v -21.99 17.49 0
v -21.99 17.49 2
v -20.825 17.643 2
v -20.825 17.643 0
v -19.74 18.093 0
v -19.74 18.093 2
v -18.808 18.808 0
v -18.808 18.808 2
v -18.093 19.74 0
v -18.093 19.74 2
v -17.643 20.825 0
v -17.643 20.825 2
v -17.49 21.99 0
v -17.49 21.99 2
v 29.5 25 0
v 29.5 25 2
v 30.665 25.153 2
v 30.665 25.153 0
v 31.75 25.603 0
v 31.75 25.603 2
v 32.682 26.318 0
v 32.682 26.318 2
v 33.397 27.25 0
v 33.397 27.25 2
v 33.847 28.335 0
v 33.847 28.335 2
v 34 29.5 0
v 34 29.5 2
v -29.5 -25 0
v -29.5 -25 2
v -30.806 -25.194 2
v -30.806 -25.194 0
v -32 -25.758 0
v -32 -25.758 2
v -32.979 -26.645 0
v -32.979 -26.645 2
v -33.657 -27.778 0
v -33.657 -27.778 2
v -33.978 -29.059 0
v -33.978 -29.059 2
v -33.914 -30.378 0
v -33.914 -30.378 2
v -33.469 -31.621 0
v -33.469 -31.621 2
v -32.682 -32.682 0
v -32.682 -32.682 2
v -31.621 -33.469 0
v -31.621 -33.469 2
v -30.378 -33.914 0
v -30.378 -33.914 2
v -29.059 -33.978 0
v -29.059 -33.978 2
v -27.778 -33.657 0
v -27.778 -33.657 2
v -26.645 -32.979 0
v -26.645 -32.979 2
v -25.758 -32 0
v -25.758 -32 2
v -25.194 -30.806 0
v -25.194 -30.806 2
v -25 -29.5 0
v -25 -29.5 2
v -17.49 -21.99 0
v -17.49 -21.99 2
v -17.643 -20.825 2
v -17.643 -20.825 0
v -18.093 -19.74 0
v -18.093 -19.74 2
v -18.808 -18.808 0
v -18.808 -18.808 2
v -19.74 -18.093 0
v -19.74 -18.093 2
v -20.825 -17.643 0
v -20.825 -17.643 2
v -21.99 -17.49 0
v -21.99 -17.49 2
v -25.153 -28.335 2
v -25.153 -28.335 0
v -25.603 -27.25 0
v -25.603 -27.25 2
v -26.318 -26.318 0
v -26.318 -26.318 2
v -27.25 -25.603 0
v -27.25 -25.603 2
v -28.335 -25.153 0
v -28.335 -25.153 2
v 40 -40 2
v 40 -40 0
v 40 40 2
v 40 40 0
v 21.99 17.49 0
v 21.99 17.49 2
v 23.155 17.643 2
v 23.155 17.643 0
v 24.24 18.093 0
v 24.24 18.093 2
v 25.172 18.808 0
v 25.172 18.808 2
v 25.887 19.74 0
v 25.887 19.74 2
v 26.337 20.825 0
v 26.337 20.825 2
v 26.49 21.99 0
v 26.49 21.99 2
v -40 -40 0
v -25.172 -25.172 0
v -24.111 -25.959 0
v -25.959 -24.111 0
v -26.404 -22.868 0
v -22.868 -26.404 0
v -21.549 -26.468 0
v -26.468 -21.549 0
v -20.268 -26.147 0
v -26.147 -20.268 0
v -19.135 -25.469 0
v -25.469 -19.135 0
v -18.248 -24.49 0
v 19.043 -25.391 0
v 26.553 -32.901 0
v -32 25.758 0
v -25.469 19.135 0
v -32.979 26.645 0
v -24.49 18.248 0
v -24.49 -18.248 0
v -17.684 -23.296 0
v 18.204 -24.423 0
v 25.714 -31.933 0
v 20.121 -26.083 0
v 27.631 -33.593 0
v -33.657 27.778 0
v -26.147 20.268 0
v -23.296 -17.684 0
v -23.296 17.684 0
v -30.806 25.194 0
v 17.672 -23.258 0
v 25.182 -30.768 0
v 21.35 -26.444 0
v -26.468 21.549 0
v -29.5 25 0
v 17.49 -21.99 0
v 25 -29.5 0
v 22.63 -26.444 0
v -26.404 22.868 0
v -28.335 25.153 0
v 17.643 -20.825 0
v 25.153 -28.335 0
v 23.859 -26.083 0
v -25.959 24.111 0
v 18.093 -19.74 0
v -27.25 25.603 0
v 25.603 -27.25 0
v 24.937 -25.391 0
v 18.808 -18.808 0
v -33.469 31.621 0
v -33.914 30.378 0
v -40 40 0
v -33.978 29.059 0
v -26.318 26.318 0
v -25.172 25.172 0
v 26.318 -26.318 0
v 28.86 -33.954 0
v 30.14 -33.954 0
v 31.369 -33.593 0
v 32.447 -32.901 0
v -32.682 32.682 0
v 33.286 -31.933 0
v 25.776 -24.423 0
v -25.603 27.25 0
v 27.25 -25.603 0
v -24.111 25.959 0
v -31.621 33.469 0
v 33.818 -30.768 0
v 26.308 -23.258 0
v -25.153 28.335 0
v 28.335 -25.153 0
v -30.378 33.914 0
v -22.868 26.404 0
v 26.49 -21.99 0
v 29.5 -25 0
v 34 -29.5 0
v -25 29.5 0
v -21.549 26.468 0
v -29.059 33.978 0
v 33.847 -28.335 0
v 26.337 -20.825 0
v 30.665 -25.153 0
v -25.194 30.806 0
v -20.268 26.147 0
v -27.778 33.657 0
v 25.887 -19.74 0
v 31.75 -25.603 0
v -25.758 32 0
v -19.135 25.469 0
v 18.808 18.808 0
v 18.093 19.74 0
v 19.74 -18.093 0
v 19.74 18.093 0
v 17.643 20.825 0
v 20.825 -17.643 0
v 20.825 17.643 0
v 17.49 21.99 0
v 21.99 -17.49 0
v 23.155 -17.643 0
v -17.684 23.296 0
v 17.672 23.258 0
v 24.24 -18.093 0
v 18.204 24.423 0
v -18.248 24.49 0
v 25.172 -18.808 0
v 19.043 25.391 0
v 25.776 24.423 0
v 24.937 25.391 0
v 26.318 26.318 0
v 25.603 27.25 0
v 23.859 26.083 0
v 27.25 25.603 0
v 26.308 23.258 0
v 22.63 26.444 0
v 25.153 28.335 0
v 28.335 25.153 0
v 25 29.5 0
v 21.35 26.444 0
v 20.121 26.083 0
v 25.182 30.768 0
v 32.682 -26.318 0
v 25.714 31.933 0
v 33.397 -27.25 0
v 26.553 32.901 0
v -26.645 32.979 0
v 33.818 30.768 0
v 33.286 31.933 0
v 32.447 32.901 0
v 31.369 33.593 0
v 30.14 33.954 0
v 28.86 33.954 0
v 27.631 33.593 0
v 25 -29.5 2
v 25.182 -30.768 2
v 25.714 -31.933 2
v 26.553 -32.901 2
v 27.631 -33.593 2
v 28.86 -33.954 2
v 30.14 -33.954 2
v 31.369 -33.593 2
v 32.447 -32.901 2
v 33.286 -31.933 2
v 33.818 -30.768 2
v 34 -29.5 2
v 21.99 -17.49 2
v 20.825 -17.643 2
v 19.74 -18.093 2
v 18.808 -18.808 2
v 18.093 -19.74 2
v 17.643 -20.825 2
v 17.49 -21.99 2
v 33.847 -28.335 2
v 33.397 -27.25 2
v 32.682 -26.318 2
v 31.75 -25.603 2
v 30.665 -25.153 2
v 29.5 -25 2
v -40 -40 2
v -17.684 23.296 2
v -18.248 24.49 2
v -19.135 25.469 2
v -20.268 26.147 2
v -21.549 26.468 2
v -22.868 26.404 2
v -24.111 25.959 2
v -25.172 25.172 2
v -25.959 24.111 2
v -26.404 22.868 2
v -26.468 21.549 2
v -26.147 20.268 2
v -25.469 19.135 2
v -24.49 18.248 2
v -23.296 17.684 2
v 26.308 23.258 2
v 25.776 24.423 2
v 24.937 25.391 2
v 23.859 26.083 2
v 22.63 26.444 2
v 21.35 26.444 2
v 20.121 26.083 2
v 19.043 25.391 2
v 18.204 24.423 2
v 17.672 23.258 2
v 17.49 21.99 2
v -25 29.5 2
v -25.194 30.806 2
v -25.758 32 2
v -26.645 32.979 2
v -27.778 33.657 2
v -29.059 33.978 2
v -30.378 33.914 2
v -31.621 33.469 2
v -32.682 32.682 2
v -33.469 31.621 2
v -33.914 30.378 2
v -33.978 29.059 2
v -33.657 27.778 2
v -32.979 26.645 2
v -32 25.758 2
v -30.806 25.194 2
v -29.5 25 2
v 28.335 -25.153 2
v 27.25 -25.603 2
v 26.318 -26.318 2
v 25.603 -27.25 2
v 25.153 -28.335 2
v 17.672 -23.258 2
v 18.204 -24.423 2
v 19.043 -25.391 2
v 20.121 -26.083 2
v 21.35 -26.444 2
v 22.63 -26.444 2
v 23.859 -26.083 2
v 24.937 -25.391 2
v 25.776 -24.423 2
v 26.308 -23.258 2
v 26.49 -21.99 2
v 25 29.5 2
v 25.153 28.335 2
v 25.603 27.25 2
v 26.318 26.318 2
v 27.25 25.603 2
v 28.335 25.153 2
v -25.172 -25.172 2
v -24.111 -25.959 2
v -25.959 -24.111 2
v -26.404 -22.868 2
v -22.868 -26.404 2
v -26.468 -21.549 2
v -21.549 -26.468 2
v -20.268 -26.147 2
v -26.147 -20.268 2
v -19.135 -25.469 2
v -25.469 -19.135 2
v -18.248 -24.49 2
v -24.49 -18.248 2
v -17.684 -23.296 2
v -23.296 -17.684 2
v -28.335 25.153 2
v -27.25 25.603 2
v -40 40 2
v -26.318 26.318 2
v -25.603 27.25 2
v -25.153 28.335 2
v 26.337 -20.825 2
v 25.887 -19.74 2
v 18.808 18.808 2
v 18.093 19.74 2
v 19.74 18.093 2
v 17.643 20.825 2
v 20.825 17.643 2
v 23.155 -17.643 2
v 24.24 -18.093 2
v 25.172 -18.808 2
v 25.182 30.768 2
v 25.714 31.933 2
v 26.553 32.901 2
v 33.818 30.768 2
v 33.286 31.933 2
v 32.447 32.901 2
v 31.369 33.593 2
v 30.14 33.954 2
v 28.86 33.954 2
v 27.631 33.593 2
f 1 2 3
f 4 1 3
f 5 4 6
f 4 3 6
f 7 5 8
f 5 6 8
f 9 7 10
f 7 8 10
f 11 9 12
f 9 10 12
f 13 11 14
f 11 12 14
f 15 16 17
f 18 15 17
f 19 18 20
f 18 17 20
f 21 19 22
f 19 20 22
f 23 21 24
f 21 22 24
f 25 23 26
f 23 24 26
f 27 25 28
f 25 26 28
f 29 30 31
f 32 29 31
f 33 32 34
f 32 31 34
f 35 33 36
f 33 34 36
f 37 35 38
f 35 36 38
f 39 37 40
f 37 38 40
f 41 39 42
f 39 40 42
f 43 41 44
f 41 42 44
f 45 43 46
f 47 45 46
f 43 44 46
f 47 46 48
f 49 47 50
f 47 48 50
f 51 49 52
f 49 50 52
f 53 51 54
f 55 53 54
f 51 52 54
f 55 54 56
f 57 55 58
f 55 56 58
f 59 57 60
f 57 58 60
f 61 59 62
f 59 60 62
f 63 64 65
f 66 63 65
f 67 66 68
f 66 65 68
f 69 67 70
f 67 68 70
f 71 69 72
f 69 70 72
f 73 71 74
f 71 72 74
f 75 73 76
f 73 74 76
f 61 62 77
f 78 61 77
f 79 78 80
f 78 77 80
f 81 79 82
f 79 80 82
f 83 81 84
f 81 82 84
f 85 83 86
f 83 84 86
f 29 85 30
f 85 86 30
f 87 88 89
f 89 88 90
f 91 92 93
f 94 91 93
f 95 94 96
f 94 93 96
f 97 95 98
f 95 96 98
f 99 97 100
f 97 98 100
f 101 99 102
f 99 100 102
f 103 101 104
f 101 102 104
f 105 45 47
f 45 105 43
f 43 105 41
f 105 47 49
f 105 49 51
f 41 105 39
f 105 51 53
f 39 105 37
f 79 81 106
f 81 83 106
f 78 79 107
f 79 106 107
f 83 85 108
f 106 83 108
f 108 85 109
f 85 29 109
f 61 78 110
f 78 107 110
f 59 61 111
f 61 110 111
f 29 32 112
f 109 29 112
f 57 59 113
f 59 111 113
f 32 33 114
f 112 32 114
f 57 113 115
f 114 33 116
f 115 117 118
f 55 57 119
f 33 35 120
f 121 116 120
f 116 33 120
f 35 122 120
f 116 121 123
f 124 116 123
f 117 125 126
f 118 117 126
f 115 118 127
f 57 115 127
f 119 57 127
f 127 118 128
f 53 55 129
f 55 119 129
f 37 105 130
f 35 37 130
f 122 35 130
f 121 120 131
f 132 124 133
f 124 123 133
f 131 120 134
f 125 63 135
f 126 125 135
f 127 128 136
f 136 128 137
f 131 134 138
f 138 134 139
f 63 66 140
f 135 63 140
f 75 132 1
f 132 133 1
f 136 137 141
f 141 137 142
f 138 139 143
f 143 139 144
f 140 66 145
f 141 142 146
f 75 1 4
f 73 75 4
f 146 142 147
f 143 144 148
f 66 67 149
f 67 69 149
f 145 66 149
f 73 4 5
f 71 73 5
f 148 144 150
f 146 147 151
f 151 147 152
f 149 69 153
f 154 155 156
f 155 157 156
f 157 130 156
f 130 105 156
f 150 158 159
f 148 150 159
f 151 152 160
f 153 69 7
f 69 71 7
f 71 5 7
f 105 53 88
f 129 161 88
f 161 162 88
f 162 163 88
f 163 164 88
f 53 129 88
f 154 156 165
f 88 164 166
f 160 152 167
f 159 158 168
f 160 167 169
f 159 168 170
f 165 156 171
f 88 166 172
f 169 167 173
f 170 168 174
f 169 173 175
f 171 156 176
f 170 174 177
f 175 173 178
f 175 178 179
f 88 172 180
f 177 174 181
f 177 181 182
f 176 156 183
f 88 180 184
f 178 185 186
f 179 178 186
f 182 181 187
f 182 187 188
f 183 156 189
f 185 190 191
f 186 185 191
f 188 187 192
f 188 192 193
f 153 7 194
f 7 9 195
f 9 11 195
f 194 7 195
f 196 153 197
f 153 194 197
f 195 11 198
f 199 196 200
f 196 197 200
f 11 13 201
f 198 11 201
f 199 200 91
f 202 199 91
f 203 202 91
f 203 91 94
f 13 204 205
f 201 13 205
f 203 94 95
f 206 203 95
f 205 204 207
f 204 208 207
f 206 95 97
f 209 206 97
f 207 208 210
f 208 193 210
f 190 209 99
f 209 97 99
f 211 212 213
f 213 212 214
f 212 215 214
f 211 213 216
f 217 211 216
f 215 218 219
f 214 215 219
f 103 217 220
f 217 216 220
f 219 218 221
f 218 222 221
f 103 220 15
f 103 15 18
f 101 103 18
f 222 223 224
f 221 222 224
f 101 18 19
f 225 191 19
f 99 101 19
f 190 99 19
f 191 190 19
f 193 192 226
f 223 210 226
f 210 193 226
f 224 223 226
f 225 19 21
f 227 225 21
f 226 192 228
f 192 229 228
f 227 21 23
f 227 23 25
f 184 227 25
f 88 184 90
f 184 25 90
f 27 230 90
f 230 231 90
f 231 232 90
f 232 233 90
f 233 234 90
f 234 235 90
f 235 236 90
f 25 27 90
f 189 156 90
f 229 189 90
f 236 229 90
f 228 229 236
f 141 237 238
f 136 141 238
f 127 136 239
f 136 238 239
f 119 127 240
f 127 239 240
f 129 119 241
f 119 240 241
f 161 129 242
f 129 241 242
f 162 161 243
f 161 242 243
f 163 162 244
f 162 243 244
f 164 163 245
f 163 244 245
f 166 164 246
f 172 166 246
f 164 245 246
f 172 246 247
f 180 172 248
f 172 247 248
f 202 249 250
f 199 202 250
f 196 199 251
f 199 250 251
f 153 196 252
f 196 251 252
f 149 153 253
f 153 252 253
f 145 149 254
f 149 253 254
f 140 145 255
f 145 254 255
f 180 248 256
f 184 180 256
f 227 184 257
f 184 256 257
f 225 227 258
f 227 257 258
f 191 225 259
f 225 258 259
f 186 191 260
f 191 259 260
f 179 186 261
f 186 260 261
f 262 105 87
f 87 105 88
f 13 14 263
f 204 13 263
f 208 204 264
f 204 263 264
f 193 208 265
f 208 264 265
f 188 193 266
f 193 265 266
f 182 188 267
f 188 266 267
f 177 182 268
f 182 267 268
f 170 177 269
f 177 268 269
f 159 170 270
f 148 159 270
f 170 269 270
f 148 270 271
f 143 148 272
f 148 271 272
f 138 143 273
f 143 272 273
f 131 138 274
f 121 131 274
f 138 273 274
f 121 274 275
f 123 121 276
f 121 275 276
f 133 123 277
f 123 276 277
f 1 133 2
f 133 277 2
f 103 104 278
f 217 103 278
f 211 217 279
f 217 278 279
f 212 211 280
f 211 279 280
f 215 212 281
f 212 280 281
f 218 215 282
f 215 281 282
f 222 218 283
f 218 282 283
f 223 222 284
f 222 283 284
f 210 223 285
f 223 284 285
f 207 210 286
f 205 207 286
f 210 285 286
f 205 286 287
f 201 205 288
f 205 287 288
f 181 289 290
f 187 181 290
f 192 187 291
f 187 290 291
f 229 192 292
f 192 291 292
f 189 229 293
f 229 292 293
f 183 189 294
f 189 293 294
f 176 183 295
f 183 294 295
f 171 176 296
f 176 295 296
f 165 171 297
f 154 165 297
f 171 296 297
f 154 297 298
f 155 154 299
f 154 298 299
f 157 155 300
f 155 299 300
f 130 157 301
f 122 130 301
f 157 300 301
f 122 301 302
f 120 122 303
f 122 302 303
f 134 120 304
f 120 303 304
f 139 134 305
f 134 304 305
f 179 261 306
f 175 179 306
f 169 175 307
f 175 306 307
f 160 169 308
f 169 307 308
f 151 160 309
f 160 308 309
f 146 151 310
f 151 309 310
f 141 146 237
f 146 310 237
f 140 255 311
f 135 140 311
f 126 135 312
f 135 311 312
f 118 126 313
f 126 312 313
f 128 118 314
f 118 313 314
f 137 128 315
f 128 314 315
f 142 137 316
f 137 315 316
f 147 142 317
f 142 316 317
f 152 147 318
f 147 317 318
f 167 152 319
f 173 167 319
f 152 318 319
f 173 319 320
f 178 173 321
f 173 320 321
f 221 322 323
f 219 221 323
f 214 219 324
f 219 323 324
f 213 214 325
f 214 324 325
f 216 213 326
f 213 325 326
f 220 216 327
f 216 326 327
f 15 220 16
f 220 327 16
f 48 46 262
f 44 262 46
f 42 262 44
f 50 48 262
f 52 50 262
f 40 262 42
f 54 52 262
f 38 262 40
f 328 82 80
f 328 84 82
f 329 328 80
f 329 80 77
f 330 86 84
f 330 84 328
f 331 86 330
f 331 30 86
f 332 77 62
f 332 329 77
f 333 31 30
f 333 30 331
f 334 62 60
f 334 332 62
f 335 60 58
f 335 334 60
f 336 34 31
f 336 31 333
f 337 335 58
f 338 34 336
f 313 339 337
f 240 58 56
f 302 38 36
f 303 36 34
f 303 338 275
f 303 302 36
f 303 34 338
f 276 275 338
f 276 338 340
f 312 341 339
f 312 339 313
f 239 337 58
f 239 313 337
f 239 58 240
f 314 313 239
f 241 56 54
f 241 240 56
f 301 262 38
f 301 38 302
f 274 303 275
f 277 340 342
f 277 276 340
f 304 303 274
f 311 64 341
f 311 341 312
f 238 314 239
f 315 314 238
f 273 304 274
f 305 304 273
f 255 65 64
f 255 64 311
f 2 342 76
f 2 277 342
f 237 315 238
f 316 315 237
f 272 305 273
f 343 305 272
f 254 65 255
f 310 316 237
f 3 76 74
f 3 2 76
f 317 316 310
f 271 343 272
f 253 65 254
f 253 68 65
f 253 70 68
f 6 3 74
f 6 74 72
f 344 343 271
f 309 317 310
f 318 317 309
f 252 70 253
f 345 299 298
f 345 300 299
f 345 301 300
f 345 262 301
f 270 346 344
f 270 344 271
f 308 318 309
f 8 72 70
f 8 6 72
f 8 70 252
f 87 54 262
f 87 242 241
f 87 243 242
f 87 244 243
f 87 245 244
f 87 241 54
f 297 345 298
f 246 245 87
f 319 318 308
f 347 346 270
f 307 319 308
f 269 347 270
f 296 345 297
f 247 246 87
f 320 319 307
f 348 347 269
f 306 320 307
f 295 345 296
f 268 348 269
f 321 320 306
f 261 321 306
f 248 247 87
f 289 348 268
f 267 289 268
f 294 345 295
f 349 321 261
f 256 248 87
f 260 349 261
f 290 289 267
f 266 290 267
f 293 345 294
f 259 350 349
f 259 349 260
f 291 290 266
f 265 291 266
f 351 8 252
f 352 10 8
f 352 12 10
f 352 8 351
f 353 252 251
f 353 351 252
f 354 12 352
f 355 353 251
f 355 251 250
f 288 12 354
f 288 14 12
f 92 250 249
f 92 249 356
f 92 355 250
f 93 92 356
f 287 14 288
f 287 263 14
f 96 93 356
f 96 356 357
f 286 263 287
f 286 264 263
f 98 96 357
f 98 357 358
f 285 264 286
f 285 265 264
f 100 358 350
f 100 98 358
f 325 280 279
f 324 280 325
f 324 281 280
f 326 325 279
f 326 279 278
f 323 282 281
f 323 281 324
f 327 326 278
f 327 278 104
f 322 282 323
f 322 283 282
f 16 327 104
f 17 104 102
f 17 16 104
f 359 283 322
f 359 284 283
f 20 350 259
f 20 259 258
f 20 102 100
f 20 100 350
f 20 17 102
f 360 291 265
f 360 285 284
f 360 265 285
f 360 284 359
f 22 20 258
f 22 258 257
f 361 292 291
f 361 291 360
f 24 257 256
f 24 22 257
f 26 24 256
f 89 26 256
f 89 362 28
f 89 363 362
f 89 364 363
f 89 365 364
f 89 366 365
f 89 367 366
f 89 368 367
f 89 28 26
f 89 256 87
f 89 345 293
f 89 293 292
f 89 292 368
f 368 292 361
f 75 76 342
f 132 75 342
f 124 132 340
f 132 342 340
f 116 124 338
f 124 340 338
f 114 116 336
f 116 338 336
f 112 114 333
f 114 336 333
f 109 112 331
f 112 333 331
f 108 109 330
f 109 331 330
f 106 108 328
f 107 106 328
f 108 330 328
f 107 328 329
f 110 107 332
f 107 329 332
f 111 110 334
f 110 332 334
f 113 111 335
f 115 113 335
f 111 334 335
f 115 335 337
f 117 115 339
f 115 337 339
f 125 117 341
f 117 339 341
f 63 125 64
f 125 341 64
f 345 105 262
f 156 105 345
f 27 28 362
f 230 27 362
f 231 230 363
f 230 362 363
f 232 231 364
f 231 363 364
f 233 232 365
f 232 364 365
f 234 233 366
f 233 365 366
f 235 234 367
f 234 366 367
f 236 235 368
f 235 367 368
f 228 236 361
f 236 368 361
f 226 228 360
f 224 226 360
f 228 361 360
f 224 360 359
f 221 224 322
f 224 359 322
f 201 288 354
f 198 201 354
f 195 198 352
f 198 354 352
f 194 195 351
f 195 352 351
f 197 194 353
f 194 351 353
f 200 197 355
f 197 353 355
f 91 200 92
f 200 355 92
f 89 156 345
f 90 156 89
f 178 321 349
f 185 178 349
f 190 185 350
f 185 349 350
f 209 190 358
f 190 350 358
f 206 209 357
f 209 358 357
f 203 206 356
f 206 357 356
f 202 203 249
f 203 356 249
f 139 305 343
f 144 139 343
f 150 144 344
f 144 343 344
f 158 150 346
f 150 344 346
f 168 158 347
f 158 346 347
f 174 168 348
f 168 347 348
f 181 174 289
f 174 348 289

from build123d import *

# Parameters (mm, degrees)
SKETCH_1_W          = 80
SKETCH_1_H          = 80
EXTRUDE_1_DEPTH     = 2
CUT_EXTRUDE_1_DEPTH = 10


with BuildPart() as part:
    # ｽｹｯﾁ1 → ﾎﾞｽ - 押し出し1 (new body)
    with BuildSketch(Plane.XY):
        Rectangle(SKETCH_1_W, SKETCH_1_H)
    extrude(amount=EXTRUDE_1_DEPTH)

    # ｽｹｯﾁ2 → ｶｯﾄ - 押し出し1 (cut)
    with BuildSketch(Plane.XY.offset(2)):
        with BuildLine():
            ThreePointArc((29.5, -25), (26.318019485, -26.318019485), (25, -29.5))
            Line((25, -29.5), (29.5, -29.5))
            Line((29.5, -29.5), (29.5, -25))
        make_face()
        with BuildLine():
            Line((29.5, -29.5), (25, -29.5))
            ThreePointArc((25, -29.5), (29.5, -34), (34, -29.5))
            ThreePointArc((34, -29.5), (32.681980515, -26.318019485), (29.5, -25))
            Line((29.5, -25), (29.5, -29.5))
        make_face()
        with BuildLine():
            ThreePointArc((21.99, -17.49), (18.808019485, -18.808019485), (17.49, -21.99))
            Line((17.49, -21.99), (21.99, -21.99))
            Line((21.99, -21.99), (21.99, -17.49))
        make_face()
        with BuildLine():
            Line((21.99, -21.99), (17.49, -21.99))
            ThreePointArc((17.49, -21.99), (21.99, -26.49), (26.49, -21.99))
            ThreePointArc((26.49, -21.99), (25.171980515, -18.808019485), (21.99, -17.49))
            Line((21.99, -17.49), (21.99, -21.99))
        make_face()
        with BuildLine():
            ThreePointArc((25, 29.5), (26.318019485, 26.318019485), (29.5, 25))
            Line((29.5, 25), (29.5, 29.5))
            Line((29.5, 29.5), (25, 29.5))
        make_face()
        with BuildLine():
            Line((29.5, 29.5), (29.5, 25))
            ThreePointArc((29.5, 25), (32.681980515, 26.318019485), (34, 29.5))
            ThreePointArc((34, 29.5), (29.5, 34), (25, 29.5))
            Line((25, 29.5), (29.5, 29.5))
        make_face()
        with BuildLine():
            ThreePointArc((17.49, 21.99), (18.808019485, 18.808019485), (21.99, 17.49))
            Line((21.99, 17.49), (21.99, 21.99))
            Line((21.99, 21.99), (17.49, 21.99))
        make_face()
        with BuildLine():
            Line((21.99, 21.99), (21.99, 17.49))
            ThreePointArc((21.99, 17.49), (25.171980515, 18.808019485), (26.49, 21.99))
            ThreePointArc((26.49, 21.99), (21.99, 26.49), (17.49, 21.99))
            Line((17.49, 21.99), (21.99, 21.99))
        make_face()
        with BuildLine():
            ThreePointArc((-21.99, -17.49), (-25.171980515, -25.171980515), (-17.49, -21.99))
            Line((-17.49, -21.99), (-21.99, -21.99))
            Line((-21.99, -21.99), (-21.99, -17.49))
        make_face()
        with BuildLine():
            Line((-21.99, -21.99), (-17.49, -21.99))
            ThreePointArc((-17.49, -21.99), (-18.808019485, -18.808019485), (-21.99, -17.49))
            Line((-21.99, -17.49), (-21.99, -21.99))
        make_face()
        with BuildLine():
            ThreePointArc((-29.5, -25), (-32.681980515, -32.681980515), (-25, -29.5))
            Line((-25, -29.5), (-29.5, -29.5))
            Line((-29.5, -29.5), (-29.5, -25))
        make_face()
        with BuildLine():
            Line((-29.5, -29.5), (-25, -29.5))
            ThreePointArc((-25, -29.5), (-26.318019485, -26.318019485), (-29.5, -25))
            Line((-29.5, -25), (-29.5, -29.5))
        make_face()
        with BuildLine():
            ThreePointArc((-17.49, 21.99), (-25.171980515, 25.171980515), (-21.99, 17.49))
            Line((-21.99, 17.49), (-21.99, 21.99))
            Line((-21.99, 21.99), (-17.49, 21.99))
        make_face()
        with BuildLine():
            Line((-21.99, 21.99), (-21.99, 17.49))
            ThreePointArc((-21.99, 17.49), (-18.808019485, 18.808019485), (-17.49, 21.99))
            Line((-17.49, 21.99), (-21.99, 21.99))
        make_face()
        with BuildLine():
            ThreePointArc((-25, 29.5), (-32.681980515, 32.681980515), (-29.5, 25))
            Line((-29.5, 25), (-29.5, 29.5))
            Line((-29.5, 29.5), (-25, 29.5))
        make_face()
        with BuildLine():
            Line((-29.5, 29.5), (-29.5, 25))
            ThreePointArc((-29.5, 25), (-26.318019485, 26.318019485), (-25, 29.5))
            Line((-25, 29.5), (-29.5, 29.5))
        make_face()
    extrude(amount=-CUT_EXTRUDE_1_DEPTH, mode=Mode.SUBTRACT)


solid = part.part
